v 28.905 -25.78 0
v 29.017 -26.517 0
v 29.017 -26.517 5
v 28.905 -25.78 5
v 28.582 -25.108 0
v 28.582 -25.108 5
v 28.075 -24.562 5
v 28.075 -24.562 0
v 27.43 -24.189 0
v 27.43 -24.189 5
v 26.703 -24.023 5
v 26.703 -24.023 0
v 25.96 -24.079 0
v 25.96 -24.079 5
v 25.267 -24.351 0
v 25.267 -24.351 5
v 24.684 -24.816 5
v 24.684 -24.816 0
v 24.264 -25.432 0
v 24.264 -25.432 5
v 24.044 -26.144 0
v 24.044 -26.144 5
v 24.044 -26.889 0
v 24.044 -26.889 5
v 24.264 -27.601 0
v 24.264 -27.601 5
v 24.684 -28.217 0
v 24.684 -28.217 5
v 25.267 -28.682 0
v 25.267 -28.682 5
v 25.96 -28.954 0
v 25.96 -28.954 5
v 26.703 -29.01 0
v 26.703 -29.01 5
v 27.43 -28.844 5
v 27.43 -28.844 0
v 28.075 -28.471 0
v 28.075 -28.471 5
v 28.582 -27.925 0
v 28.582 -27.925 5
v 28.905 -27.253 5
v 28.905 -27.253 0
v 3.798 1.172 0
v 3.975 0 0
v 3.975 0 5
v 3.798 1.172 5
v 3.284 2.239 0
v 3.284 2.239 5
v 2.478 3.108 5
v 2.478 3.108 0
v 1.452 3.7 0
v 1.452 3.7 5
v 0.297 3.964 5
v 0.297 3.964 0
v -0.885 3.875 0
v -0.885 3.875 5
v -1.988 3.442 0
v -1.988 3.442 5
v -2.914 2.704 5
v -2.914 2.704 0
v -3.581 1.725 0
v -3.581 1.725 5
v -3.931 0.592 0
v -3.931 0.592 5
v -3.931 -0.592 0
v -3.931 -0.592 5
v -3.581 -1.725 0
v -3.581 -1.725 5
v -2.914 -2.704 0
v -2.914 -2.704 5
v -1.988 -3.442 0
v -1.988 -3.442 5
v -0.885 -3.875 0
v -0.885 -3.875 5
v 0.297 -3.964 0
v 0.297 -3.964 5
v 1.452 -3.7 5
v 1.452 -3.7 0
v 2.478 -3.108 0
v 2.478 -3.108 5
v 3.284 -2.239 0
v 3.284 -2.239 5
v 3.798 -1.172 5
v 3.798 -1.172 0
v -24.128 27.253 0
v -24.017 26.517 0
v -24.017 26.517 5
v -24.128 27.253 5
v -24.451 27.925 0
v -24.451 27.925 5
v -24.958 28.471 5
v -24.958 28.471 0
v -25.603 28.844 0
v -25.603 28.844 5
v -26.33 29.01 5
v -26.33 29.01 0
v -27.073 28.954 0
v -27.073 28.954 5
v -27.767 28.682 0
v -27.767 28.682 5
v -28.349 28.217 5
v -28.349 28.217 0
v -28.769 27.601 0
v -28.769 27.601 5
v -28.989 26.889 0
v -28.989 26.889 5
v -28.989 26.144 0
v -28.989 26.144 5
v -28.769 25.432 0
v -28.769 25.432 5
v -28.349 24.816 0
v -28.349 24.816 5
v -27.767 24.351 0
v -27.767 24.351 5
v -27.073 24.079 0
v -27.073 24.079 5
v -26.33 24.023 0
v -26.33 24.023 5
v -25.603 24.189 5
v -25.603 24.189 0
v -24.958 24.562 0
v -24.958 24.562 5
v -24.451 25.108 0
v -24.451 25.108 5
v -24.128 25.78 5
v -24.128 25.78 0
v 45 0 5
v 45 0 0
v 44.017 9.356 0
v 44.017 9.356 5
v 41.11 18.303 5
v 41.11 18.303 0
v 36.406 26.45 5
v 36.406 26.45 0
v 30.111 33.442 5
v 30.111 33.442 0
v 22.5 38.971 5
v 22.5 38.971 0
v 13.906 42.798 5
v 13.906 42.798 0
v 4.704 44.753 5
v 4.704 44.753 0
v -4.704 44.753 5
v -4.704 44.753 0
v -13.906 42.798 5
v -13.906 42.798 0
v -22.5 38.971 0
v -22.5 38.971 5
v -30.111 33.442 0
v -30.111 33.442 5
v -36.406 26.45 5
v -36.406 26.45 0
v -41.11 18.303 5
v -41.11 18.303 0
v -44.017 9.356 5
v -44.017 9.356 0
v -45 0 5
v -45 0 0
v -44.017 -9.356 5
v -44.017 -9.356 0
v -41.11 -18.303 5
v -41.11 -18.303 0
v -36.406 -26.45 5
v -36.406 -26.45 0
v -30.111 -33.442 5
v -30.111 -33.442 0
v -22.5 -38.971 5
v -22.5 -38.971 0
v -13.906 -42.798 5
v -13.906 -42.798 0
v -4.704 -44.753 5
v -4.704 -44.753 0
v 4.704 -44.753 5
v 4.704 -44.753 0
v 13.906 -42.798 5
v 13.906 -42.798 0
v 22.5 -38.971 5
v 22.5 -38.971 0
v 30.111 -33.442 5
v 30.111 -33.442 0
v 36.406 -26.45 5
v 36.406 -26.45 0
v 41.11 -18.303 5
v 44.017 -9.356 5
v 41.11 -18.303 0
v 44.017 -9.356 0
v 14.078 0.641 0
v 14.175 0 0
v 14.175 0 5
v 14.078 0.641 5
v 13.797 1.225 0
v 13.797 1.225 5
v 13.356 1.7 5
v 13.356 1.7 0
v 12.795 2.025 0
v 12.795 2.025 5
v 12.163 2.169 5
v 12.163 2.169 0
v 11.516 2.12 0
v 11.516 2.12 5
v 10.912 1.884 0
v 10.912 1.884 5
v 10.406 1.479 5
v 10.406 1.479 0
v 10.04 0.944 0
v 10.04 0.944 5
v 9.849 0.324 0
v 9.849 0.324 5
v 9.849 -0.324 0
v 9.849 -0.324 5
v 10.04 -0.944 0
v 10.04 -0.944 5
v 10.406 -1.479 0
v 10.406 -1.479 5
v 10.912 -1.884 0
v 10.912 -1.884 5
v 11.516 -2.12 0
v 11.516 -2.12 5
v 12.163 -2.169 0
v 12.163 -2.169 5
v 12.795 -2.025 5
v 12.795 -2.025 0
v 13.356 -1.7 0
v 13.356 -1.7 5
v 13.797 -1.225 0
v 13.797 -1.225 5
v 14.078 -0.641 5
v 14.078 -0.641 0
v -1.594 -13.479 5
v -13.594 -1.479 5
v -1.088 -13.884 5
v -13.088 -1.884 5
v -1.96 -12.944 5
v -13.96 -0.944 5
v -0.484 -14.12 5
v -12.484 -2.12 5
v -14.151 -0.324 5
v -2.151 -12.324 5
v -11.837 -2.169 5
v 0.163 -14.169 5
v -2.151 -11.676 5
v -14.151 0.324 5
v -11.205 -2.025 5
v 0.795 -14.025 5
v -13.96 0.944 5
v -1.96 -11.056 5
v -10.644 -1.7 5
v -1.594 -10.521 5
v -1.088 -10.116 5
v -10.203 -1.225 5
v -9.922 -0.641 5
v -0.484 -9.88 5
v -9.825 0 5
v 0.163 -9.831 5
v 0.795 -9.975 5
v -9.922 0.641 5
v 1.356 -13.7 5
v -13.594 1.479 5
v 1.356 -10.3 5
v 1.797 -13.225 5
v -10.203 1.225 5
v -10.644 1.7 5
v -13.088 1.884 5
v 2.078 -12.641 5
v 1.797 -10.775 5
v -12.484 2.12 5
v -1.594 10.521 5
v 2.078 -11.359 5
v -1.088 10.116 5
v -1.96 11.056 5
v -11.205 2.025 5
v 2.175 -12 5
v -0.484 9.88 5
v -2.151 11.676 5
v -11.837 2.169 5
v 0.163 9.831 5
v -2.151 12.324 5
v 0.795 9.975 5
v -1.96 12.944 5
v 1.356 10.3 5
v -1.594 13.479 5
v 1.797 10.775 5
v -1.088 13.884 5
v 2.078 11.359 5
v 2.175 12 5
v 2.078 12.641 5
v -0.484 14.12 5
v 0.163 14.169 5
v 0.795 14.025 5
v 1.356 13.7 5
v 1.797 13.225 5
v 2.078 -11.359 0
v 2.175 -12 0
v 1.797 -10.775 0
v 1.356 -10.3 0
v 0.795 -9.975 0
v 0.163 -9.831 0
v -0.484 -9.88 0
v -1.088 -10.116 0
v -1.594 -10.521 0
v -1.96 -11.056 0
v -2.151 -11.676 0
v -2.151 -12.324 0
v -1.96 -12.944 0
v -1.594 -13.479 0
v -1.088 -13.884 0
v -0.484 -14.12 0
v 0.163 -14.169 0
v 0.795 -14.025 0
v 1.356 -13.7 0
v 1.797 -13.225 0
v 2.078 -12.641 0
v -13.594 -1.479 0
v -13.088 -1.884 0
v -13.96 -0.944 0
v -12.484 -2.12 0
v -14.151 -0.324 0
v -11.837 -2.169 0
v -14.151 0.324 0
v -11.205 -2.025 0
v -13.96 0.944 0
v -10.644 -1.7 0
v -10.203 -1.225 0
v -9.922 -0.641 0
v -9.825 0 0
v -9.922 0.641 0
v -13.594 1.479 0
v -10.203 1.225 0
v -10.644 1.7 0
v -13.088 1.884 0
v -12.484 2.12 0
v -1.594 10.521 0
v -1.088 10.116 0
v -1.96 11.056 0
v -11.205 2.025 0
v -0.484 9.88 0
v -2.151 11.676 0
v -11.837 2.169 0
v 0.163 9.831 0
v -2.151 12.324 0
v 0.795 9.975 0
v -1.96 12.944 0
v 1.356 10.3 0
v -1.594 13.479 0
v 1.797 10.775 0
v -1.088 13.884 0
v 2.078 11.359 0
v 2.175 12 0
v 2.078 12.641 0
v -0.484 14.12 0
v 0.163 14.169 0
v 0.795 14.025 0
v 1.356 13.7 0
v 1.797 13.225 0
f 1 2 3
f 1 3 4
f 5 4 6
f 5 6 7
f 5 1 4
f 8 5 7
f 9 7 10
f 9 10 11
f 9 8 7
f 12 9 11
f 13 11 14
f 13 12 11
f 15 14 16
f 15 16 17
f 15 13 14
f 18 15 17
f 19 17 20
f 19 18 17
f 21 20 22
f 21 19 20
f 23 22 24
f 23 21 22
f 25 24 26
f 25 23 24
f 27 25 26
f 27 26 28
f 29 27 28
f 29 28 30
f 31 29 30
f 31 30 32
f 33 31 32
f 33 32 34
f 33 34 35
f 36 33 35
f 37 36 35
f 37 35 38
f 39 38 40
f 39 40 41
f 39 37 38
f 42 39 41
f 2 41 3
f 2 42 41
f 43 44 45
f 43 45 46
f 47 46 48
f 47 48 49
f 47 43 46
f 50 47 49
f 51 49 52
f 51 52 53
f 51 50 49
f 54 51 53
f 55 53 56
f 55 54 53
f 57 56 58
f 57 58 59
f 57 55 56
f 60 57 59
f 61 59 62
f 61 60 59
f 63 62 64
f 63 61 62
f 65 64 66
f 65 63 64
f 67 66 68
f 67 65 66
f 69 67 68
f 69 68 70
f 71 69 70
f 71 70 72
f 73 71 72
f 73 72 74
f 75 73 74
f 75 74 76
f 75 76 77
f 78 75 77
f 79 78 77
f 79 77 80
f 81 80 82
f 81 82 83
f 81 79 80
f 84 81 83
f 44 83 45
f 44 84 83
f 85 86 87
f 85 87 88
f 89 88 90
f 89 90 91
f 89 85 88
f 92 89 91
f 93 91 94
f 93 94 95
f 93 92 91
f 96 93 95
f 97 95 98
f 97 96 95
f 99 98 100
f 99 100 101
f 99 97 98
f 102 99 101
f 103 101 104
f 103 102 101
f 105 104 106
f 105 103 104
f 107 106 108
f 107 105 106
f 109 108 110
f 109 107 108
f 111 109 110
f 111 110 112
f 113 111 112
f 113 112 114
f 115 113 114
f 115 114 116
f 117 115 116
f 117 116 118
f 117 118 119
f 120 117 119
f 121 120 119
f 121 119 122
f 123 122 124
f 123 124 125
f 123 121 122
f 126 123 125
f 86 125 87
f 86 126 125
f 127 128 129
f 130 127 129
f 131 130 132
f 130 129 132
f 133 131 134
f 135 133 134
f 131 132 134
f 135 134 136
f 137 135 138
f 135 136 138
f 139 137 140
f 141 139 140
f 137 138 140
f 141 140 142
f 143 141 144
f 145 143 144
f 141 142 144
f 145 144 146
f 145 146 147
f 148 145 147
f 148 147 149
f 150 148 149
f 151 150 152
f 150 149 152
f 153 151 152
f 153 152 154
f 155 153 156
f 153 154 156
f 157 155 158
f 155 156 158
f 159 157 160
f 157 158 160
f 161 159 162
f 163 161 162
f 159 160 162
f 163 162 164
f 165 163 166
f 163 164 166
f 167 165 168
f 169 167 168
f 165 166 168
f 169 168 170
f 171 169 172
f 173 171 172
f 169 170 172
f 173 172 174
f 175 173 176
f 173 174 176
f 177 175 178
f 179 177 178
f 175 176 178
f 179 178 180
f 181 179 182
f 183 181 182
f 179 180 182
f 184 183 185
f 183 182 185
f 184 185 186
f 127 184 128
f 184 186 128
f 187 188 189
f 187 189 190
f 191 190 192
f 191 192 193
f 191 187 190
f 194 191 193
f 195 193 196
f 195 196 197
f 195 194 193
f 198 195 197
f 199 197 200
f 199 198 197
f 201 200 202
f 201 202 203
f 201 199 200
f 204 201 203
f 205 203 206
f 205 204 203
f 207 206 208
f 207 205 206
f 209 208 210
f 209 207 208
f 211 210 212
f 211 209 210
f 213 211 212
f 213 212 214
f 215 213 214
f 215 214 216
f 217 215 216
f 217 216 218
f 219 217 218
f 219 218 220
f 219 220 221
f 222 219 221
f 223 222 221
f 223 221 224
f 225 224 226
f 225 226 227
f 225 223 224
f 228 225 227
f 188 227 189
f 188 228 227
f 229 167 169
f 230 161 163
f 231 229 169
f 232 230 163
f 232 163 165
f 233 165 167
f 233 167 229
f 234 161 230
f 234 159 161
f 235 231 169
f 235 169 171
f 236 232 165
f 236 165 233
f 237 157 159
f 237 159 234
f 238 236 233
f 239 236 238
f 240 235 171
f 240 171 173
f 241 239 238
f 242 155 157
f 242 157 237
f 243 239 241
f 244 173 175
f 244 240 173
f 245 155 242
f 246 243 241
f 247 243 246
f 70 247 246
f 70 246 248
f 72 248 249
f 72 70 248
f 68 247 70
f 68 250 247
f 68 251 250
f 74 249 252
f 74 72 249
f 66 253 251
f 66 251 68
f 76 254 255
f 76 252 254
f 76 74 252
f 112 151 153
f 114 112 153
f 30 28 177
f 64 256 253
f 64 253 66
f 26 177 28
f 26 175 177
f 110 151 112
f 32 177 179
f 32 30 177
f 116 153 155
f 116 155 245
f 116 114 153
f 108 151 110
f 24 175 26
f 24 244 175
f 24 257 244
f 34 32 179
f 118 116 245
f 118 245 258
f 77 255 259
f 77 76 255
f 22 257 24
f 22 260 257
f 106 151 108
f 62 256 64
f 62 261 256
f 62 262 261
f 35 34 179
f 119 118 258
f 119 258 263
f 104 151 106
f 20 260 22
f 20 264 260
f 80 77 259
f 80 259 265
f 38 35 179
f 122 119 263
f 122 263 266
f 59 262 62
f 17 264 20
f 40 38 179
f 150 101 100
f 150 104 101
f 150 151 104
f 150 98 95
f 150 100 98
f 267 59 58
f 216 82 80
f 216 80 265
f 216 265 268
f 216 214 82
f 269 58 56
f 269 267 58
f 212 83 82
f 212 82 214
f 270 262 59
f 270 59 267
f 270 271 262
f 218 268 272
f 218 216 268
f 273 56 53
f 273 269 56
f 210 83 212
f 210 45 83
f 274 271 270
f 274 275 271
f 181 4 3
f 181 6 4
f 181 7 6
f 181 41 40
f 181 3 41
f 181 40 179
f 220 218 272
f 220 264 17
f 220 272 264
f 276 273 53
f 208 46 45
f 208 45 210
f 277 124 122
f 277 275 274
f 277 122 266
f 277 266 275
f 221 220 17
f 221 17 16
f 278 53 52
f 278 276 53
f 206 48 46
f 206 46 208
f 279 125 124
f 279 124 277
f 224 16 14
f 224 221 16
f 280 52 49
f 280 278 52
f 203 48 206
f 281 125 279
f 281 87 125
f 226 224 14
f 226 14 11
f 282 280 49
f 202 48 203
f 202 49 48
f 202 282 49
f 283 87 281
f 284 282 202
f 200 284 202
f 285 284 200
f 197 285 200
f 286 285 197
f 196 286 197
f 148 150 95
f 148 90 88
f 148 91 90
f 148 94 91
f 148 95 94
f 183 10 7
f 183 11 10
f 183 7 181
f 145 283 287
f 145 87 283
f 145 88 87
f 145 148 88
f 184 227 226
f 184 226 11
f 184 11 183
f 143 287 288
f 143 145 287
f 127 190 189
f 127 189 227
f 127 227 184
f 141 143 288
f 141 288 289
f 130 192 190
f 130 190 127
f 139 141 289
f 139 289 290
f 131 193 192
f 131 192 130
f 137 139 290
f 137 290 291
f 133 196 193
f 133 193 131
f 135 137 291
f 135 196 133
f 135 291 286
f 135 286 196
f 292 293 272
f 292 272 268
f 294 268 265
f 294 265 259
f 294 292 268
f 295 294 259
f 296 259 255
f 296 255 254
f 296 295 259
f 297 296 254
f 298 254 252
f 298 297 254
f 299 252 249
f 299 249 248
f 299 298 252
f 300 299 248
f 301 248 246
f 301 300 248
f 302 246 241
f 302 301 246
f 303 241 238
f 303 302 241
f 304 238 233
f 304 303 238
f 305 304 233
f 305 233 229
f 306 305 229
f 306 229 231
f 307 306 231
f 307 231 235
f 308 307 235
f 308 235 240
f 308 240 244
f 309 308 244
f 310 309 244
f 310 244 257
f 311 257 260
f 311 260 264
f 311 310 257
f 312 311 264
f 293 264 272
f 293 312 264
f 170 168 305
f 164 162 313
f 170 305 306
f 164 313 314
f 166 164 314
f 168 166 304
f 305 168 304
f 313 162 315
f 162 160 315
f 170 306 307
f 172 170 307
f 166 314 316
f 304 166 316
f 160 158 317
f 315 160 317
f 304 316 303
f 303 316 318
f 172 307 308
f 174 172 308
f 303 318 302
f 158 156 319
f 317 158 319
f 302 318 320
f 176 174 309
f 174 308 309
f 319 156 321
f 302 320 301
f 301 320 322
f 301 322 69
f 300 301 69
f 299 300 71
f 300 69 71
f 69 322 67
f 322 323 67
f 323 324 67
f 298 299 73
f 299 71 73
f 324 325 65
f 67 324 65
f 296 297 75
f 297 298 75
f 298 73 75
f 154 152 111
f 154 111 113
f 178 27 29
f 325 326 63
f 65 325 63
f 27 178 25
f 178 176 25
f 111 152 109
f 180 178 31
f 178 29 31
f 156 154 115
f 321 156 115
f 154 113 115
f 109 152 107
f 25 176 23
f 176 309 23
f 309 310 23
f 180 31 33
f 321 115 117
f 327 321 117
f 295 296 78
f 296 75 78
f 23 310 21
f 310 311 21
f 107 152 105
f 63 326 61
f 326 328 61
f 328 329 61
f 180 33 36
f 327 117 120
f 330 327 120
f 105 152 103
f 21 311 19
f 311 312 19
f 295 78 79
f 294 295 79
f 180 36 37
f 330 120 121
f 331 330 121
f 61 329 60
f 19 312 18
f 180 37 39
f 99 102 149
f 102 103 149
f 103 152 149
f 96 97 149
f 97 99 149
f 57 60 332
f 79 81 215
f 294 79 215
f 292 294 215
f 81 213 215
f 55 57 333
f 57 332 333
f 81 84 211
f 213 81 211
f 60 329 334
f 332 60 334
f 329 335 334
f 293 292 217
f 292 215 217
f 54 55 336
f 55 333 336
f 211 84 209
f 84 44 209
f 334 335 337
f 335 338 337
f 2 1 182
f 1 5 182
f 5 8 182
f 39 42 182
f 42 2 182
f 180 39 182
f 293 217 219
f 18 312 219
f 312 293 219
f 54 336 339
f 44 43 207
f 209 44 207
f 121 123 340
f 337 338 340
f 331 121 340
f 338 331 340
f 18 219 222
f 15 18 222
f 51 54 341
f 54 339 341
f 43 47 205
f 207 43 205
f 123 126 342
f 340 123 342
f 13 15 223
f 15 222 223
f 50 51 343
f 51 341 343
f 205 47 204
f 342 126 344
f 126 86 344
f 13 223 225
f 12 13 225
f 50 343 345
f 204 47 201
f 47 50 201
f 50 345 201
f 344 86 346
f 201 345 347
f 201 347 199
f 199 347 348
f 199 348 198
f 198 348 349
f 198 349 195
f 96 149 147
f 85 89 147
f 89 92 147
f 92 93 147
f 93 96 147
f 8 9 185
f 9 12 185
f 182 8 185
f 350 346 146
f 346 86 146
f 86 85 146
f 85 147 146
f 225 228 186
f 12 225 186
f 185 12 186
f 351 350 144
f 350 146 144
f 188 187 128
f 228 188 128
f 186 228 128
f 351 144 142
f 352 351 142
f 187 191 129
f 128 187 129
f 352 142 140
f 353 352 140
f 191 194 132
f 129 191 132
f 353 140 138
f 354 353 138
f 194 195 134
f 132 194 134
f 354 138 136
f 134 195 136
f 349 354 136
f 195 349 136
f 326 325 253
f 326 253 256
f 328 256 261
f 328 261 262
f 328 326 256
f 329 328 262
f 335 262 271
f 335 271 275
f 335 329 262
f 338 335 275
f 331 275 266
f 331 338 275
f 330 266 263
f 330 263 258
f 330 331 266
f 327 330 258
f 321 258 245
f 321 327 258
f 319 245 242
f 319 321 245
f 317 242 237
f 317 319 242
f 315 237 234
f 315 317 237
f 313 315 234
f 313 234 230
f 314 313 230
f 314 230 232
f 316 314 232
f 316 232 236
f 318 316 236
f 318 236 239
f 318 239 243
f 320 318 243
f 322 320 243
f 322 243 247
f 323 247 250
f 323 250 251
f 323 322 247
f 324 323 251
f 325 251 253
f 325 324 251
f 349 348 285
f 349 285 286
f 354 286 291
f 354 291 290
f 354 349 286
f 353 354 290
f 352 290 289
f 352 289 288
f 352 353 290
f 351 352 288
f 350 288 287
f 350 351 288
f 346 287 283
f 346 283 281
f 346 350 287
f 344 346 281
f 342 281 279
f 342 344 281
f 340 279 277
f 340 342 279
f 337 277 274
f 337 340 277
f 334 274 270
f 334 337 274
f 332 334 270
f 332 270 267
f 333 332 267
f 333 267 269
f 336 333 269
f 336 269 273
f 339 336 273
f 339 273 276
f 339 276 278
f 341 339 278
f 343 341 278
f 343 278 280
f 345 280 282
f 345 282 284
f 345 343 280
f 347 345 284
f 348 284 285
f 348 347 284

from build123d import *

# Parameters (mm, degrees)
SKETCH1_R           = 45
SKETCH1_R_2         = 2.175
SKETCH1_R_3         = 3.975
SKETCH1_R_4         = 2.5
BOSS_EXTRUDE1_DEPTH = 5


with BuildPart() as part:
    # Sketch1 → Boss-Extrude1 (new body)
    with BuildSketch(Plane.XY):
        Circle(SKETCH1_R)
        with Locations((12, 0)):
            Circle(SKETCH1_R_2, mode=Mode.SUBTRACT)
        with Locations((0, 12)):
            Circle(SKETCH1_R_2, mode=Mode.SUBTRACT)
        with Locations((-12, 0)):
            Circle(SKETCH1_R_2, mode=Mode.SUBTRACT)
        with Locations((0, -12)):
            Circle(SKETCH1_R_2, mode=Mode.SUBTRACT)
        Circle(SKETCH1_R_3, mode=Mode.SUBTRACT)
        with Locations((-26.516504294, 26.516504294)):
            Circle(SKETCH1_R_4, mode=Mode.SUBTRACT)
        with Locations((26.516504294, -26.516504294)):
            Circle(SKETCH1_R_4, mode=Mode.SUBTRACT)
    extrude(amount=BOSS_EXTRUDE1_DEPTH)


solid = part.part
